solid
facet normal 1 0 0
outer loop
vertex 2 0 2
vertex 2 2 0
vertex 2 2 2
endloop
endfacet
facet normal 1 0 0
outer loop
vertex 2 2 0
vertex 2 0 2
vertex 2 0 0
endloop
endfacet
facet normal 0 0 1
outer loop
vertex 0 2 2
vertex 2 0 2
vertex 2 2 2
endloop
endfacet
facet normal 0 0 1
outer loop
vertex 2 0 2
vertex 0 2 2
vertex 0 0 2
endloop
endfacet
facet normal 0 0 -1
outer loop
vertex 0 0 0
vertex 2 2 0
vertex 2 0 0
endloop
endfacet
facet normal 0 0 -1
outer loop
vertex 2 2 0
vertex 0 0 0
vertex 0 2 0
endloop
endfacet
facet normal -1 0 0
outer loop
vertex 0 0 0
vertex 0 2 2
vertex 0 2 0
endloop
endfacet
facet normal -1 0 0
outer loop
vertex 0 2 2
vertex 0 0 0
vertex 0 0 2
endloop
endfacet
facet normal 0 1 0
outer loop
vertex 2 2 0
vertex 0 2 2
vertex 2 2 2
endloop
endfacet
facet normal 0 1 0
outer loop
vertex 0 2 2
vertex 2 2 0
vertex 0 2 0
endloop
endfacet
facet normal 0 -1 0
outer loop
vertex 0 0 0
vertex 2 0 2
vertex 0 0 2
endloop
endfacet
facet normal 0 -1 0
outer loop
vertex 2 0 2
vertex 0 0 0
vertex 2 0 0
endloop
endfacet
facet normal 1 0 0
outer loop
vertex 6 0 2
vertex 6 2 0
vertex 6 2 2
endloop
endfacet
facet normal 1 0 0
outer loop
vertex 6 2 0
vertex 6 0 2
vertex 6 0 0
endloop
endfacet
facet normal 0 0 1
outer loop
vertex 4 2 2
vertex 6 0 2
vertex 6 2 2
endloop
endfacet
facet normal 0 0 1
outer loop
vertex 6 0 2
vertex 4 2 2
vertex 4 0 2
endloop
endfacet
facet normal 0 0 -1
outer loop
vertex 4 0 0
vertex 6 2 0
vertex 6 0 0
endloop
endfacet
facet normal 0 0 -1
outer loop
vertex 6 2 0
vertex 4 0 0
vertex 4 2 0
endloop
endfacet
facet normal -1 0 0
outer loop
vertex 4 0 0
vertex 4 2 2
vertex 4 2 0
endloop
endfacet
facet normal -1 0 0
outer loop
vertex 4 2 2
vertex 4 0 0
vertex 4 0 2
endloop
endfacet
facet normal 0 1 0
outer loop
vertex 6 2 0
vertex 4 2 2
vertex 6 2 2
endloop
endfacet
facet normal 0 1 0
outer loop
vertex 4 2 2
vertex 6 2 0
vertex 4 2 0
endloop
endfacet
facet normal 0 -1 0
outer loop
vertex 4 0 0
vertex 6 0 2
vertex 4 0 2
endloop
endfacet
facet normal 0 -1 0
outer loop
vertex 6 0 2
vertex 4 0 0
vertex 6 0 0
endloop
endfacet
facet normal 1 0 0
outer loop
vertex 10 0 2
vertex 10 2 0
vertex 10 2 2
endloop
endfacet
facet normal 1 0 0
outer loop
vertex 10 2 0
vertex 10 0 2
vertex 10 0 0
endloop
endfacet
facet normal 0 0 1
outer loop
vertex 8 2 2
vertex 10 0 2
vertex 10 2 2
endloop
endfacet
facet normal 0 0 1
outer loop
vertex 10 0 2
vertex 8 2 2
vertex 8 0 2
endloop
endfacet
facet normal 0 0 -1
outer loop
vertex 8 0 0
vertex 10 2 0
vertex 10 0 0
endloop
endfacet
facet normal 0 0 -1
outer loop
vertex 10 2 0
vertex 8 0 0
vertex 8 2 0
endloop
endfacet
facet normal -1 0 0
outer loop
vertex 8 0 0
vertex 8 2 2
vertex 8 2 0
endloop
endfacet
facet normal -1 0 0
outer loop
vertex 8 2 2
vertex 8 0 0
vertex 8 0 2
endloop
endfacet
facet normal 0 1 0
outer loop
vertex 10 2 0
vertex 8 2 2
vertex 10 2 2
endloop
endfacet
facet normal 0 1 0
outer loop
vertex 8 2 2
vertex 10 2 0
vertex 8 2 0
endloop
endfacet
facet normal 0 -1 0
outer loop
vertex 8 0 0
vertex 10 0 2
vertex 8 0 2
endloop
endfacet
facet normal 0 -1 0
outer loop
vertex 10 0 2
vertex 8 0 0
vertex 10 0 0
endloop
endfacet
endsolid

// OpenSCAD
union() {
	translate([0, 0, 0]) cube(size=[2,2,2], center=false);
	translate([4, 0, 0]) cube(size=[2,2,2], center=false);
	translate([8, 0, 0]) cube(size=[2,2,2], center=false);
}
